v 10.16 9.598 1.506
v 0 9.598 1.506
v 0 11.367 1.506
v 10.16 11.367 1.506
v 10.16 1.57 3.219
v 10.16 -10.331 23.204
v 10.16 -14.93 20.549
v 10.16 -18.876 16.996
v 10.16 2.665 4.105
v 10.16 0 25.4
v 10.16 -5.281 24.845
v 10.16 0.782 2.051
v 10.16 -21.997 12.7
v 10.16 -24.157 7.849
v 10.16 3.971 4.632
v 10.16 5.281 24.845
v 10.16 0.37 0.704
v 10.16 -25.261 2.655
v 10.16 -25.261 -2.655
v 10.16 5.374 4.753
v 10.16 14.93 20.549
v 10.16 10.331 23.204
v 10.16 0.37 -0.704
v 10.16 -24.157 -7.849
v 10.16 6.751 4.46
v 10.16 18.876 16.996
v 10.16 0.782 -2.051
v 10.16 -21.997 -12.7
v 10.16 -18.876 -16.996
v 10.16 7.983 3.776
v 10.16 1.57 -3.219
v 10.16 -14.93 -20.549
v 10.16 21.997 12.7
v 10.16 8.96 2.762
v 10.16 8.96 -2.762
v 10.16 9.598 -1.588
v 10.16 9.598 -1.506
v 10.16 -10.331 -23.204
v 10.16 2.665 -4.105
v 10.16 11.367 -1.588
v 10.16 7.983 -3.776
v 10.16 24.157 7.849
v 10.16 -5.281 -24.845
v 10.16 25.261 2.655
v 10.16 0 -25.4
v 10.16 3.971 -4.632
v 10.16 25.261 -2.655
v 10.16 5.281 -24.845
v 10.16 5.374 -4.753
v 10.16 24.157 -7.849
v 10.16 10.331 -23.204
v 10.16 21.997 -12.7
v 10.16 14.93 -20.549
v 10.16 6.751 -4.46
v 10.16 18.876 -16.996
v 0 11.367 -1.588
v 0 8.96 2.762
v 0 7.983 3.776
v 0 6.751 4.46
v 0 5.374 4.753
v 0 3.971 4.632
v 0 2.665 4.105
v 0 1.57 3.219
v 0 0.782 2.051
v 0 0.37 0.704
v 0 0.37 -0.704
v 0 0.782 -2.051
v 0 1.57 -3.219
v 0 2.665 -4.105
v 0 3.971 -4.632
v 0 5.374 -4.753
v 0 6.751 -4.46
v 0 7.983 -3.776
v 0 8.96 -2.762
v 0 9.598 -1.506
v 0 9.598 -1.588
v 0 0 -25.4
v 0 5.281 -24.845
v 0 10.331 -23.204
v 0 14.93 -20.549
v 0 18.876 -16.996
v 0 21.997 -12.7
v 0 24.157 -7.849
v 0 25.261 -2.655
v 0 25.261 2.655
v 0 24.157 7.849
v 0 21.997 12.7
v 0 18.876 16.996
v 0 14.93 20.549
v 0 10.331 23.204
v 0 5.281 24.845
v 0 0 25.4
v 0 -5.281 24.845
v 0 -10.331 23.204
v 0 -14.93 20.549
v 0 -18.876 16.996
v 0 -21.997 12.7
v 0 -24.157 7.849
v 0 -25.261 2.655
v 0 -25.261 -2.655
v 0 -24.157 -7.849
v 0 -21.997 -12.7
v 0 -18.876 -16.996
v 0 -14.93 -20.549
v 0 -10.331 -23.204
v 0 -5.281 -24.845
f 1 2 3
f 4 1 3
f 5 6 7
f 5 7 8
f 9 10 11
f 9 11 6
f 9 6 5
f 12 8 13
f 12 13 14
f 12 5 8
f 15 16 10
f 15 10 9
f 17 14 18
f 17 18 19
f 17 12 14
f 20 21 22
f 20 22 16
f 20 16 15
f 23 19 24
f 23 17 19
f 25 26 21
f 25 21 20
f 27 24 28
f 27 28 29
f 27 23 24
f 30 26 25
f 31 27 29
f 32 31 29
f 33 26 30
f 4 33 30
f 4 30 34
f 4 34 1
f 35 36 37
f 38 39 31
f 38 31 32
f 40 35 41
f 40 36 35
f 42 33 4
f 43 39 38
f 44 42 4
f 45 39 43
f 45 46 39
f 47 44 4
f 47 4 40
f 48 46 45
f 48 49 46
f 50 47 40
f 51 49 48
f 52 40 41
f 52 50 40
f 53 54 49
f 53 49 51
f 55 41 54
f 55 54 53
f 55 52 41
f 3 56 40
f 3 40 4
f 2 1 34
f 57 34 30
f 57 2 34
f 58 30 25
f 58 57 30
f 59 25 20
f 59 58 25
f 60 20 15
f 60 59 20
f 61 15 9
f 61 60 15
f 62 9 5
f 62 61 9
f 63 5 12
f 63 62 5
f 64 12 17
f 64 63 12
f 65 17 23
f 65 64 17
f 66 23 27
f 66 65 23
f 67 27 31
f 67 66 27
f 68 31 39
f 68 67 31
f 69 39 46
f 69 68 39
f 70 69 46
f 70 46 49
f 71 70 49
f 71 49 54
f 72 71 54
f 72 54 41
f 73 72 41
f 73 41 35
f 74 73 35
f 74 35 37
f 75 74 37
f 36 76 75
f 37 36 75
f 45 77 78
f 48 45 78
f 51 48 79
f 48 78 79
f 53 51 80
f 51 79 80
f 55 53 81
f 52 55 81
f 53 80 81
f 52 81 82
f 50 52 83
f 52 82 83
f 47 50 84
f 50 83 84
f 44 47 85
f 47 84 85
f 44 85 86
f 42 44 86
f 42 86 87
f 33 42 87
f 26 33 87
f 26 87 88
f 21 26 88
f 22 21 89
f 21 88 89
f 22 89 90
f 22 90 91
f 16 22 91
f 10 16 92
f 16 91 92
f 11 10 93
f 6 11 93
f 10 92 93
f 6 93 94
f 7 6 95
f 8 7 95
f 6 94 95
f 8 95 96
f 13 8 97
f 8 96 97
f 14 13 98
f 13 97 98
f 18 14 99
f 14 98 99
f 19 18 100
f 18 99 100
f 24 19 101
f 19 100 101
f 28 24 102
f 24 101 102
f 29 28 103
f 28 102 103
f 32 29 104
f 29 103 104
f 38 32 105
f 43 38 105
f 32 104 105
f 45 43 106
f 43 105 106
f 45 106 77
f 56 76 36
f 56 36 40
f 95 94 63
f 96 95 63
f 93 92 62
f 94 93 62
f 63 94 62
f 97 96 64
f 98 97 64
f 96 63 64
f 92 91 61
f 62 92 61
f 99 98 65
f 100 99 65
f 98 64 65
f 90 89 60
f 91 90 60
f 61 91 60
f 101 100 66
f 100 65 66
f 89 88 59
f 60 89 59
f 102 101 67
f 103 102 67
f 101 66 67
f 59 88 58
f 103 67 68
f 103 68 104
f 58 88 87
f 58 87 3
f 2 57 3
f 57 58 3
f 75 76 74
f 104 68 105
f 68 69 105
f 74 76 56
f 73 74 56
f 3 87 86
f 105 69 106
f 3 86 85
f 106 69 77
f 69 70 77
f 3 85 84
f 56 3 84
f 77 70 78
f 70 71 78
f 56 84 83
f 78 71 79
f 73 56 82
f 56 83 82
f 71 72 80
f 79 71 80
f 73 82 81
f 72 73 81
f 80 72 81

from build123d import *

# Parameters (mm, degrees)
SKETCH1_R           = 25.4
BOSS_EXTRUDE1_DEPTH = 10.16
SKETCH2_R           = 4.7625
CUT_EXTRUDE1_DEPTH  = 38.33022368
SKETCH3_W           = 1.768395793
SKETCH3_H           = 3.093534736
CUT_EXTRUDE2_DEPTH  = 38.33022368


with BuildPart() as part:
    # Sketch1 → Boss-Extrude1 (new body)
    with BuildSketch(Plane.YZ):
        with Locations(Location((0, 0, 0), (0, 0, 270))):
            Circle(SKETCH1_R)
    extrude(amount=BOSS_EXTRUDE1_DEPTH)

    # Sketch2 → Cut-Extrude1 (cut, through all)
    with BuildSketch(Plane.YZ):
        with Locations(Location((5.08, 0, 0), (0, 0, 270))):
            Circle(SKETCH2_R)
    extrude(amount=CUT_EXTRUDE1_DEPTH, mode=Mode.SUBTRACT)

    # Sketch3 → Cut-Extrude2 (cut, through all)
    with BuildSketch(Plane.YZ):
        with Locations((10.482302104, -0.040732632)):
            Rectangle(SKETCH3_W, SKETCH3_H)
    extrude(amount=CUT_EXTRUDE2_DEPTH, mode=Mode.SUBTRACT)


solid = part.part
